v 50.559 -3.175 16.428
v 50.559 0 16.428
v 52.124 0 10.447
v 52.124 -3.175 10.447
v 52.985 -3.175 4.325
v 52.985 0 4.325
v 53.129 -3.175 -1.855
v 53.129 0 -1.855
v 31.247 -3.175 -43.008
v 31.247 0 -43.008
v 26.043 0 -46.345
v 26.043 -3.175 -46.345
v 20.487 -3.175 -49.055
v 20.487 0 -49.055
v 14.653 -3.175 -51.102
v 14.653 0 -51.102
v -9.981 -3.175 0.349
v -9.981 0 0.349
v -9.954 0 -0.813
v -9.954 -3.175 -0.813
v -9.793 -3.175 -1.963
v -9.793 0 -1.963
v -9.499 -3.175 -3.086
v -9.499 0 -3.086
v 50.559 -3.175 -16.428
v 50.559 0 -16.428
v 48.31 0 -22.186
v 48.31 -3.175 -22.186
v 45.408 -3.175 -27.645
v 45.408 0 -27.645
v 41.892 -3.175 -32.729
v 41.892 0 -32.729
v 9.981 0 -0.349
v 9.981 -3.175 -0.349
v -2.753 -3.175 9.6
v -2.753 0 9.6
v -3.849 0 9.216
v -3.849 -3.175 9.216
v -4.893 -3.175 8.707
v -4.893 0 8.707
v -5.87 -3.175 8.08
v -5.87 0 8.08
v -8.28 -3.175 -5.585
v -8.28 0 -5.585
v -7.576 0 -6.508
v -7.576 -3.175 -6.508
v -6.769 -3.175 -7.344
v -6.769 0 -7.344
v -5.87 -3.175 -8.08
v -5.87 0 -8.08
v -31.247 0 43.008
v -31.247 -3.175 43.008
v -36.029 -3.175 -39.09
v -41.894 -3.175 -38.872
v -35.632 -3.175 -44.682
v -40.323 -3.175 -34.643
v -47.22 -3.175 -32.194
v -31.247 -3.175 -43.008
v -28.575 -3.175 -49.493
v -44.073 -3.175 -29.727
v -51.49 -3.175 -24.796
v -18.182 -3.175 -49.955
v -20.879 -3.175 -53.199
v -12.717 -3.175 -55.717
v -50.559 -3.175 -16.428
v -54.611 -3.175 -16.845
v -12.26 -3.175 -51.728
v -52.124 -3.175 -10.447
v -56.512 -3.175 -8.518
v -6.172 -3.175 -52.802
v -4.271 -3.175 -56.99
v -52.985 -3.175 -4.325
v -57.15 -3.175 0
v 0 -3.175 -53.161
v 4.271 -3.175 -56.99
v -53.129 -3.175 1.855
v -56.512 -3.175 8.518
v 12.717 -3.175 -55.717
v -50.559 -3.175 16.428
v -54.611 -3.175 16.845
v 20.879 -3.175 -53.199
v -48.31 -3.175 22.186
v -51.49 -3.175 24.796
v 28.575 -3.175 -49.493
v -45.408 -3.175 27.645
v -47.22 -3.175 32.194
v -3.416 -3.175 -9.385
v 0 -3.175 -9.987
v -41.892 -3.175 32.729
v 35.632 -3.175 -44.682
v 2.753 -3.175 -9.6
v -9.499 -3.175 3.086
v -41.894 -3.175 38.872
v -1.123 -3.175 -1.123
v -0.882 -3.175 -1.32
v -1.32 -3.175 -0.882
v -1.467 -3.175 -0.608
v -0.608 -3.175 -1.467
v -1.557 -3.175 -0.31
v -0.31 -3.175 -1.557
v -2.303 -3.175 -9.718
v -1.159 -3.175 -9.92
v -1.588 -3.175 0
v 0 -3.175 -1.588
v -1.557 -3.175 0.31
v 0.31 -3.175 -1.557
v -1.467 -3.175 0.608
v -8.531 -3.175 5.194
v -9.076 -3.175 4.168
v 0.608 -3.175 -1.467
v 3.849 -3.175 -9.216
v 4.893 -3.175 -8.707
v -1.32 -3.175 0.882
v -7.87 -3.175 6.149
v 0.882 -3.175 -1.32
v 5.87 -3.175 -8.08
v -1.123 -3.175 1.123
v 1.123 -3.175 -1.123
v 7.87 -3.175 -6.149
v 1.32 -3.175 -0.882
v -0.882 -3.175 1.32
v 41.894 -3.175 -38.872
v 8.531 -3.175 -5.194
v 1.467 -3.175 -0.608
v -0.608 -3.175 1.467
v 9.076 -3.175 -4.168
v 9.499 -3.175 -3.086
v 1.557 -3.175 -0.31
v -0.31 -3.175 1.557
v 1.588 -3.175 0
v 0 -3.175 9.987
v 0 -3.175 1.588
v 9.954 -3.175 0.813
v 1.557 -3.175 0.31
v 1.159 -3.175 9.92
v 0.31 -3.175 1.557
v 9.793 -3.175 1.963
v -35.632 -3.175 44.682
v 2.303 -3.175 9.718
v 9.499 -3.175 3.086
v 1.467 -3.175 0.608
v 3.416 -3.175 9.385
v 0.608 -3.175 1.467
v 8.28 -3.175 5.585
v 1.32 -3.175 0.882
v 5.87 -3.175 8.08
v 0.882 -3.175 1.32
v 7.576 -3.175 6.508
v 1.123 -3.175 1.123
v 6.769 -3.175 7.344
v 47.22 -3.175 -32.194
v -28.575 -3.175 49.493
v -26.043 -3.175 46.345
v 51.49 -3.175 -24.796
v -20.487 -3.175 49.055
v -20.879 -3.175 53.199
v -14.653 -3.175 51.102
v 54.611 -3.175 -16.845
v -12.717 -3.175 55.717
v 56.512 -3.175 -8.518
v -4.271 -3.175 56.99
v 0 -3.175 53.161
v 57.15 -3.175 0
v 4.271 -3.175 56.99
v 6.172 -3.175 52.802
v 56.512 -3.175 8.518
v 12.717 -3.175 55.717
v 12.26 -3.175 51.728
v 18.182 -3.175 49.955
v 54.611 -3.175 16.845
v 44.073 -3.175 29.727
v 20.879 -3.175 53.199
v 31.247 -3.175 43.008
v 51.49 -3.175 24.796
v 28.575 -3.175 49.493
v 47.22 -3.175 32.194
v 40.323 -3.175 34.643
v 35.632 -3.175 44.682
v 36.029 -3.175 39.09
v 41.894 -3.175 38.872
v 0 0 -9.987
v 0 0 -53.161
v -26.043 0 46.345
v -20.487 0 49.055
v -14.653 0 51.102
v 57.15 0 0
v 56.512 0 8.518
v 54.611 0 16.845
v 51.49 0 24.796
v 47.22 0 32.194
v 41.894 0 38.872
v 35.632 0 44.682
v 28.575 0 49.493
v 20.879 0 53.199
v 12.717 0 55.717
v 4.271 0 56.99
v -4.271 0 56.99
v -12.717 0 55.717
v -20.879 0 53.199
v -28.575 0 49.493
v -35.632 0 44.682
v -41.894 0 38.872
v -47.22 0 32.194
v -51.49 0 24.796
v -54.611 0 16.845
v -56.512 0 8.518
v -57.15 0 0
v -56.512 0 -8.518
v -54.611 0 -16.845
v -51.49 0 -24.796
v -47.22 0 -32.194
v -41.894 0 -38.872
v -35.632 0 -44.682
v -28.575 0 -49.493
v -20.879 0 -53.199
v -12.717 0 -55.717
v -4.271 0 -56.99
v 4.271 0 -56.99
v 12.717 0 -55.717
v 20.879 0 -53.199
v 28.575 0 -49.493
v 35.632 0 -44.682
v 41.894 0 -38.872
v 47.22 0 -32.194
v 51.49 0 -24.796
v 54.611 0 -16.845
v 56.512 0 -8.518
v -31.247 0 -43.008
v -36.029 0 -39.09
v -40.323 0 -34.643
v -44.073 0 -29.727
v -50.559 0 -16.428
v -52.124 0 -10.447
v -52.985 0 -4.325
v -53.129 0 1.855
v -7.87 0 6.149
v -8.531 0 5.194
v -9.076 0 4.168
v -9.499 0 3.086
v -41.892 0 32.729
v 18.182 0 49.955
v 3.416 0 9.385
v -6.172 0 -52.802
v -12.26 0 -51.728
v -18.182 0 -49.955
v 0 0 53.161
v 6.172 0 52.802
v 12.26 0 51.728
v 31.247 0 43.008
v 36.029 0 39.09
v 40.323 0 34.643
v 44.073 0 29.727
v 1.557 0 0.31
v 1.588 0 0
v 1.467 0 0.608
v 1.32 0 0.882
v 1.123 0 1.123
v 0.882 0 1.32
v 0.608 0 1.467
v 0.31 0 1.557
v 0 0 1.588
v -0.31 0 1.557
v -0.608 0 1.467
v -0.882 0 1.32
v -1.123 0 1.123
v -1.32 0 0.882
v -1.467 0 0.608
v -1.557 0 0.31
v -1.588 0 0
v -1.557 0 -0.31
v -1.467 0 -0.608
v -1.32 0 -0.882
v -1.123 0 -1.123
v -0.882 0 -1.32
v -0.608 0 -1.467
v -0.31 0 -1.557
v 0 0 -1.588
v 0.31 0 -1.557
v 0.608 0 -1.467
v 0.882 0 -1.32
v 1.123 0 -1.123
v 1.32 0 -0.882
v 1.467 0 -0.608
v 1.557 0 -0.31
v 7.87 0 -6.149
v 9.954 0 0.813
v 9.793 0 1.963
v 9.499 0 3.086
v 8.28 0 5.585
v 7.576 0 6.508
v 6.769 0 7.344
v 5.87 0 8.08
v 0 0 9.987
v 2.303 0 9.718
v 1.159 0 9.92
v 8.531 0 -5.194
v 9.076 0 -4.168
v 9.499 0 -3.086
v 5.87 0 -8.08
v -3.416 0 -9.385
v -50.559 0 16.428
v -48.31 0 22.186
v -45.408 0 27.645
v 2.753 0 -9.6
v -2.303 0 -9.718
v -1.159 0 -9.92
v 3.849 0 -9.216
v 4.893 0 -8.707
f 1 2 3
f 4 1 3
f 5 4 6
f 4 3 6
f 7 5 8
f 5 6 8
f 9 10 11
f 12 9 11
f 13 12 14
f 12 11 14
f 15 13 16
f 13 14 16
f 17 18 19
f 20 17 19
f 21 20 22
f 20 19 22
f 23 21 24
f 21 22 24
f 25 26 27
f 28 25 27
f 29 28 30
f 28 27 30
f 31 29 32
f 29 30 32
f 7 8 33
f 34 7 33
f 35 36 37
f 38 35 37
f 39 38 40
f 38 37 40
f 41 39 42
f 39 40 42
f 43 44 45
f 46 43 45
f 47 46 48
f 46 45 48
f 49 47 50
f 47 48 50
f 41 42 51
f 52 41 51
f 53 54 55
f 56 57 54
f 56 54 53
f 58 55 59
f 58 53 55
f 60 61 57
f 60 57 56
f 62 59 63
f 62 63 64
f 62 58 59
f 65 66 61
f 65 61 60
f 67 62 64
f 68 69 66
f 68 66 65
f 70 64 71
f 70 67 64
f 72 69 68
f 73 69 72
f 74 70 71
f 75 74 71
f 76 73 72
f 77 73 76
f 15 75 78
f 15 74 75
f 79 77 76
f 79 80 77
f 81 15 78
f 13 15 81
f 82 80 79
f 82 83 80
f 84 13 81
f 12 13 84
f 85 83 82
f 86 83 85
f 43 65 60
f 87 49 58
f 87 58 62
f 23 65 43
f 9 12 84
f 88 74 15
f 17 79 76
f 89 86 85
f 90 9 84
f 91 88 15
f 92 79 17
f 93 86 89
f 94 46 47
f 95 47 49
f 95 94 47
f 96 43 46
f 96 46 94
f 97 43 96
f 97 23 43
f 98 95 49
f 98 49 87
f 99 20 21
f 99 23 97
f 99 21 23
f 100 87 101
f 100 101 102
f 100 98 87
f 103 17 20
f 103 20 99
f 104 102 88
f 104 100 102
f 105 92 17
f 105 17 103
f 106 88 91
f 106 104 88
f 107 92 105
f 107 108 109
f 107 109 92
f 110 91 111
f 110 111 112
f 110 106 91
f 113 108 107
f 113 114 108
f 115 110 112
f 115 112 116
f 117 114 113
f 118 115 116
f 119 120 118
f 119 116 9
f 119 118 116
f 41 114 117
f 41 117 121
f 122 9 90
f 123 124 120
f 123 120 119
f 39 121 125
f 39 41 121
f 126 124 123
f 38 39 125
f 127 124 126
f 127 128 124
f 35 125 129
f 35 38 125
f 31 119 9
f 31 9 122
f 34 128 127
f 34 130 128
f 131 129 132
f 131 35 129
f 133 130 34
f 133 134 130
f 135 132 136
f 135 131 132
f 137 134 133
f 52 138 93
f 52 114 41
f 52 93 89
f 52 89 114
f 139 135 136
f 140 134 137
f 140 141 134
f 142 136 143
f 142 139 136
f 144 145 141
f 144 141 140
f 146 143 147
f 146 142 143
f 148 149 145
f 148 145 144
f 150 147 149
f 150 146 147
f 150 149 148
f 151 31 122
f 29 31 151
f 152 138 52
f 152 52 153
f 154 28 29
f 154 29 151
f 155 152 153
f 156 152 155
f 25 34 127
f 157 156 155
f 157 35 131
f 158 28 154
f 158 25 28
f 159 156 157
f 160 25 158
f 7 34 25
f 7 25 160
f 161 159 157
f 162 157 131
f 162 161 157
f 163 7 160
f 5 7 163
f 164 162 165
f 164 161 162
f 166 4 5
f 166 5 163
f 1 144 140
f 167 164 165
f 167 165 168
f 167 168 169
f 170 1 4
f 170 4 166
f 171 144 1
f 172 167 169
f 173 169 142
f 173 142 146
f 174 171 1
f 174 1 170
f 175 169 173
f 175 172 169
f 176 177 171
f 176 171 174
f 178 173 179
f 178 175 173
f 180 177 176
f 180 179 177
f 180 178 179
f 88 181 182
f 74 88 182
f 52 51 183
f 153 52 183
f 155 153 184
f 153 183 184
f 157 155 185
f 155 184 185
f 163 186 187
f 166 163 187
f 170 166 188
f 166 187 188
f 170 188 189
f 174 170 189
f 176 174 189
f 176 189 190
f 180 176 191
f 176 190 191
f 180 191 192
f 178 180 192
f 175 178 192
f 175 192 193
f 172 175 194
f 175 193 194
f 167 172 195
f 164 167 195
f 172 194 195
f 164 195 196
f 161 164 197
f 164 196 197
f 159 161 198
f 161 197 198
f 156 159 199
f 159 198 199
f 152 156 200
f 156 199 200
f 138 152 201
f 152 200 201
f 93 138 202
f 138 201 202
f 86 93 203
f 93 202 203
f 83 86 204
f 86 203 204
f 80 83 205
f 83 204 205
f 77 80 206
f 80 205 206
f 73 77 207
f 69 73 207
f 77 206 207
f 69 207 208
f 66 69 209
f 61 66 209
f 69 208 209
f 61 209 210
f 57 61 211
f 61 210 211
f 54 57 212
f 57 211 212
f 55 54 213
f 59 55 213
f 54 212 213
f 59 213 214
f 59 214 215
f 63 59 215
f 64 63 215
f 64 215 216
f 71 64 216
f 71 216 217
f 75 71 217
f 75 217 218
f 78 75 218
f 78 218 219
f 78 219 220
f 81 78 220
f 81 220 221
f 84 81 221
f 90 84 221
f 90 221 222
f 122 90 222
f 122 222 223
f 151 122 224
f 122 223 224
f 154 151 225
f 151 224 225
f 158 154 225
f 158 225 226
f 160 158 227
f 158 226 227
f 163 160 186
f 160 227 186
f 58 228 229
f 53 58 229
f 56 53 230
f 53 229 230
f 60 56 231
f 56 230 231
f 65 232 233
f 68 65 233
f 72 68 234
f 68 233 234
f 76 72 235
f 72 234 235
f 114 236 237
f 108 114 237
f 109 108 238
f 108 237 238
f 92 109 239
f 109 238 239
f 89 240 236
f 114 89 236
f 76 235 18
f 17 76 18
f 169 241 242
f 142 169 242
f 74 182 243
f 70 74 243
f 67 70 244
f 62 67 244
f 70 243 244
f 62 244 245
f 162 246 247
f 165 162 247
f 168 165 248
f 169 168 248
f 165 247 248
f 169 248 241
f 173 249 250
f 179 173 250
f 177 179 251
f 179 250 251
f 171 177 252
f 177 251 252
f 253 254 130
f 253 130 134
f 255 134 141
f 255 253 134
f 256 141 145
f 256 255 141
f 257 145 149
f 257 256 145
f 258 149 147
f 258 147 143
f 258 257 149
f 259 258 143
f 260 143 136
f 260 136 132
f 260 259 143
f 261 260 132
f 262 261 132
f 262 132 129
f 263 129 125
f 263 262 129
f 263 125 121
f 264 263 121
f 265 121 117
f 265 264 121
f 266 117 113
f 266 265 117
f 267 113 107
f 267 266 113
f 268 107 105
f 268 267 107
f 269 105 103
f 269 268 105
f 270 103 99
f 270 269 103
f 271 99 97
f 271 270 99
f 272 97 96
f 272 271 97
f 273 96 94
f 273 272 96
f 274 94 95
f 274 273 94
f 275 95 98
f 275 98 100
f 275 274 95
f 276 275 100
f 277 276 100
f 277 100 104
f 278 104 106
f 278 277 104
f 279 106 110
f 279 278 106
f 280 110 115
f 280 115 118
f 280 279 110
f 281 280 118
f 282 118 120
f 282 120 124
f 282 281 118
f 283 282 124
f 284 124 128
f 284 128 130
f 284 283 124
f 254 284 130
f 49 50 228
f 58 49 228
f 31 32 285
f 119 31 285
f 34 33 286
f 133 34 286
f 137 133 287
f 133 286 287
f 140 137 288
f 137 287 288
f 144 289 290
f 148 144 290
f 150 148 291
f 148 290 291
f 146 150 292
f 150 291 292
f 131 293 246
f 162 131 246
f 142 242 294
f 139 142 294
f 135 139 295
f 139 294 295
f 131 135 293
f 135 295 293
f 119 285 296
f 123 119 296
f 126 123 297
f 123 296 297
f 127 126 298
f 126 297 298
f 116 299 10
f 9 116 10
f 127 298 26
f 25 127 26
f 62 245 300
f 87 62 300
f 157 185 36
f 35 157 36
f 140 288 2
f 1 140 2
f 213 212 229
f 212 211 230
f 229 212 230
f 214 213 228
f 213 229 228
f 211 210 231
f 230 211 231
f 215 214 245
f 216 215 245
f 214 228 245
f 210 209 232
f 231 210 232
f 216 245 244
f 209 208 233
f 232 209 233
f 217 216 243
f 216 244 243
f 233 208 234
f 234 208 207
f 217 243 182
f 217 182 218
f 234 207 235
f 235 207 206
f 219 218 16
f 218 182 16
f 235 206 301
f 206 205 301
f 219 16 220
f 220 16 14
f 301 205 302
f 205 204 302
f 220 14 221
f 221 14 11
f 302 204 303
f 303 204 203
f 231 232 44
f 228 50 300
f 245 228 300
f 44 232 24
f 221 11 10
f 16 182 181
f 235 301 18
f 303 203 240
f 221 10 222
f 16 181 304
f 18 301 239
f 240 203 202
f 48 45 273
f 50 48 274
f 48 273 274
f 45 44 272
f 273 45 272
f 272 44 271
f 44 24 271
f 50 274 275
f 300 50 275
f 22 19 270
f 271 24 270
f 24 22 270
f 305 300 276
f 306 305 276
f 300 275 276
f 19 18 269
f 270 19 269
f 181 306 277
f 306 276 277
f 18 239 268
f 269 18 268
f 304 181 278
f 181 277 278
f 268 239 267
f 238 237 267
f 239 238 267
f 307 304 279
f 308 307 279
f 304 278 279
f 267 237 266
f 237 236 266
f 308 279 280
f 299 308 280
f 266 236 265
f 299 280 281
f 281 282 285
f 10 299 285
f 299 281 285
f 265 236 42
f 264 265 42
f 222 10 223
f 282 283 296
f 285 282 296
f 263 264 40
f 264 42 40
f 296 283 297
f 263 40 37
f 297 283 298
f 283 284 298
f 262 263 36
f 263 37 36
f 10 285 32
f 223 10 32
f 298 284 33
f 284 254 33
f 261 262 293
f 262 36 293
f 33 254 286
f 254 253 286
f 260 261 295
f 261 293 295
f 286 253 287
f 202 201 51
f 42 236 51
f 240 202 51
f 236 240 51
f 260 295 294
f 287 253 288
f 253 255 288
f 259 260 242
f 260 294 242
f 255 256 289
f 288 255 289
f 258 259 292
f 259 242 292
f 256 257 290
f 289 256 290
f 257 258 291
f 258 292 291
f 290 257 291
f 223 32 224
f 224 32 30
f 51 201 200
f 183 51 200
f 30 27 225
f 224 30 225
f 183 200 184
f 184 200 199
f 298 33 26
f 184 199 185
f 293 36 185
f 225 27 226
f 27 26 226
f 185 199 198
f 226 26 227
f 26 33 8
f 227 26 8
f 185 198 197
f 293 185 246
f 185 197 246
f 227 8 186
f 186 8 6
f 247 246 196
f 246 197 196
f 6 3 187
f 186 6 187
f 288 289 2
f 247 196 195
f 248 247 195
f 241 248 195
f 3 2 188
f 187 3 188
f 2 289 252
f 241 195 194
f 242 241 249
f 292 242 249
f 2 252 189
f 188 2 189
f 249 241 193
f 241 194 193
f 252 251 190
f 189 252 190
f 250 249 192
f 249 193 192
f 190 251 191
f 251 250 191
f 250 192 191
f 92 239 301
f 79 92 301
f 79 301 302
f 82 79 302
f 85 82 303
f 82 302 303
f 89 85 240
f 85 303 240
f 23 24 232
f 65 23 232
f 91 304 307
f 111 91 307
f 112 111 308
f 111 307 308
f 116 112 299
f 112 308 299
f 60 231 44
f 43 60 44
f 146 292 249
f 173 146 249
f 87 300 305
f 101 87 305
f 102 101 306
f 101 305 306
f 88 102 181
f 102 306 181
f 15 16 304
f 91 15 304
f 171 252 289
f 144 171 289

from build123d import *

# Parameters (mm, degrees)
F0_R     = 57.15
F0_R_2   = 1.5875
F1_DEPTH = 3.175


with BuildPart() as f1:
    # F0 (on Front) → F1 (new body)
    with BuildSketch(Plane.XZ):
        Circle(F0_R)
        with BuildLine():
            ThreePointArc((0, -53.161082), (-9.231325, -52.353446), (-18.182161, -49.955077))
            Line((-18.182161, -49.955077), (-3.415888, -9.385075))
            ThreePointArc((-3.415888, -9.385075), (-1.734292, -9.835657), (0, -9.987388))
            Line((0, -9.987388), (0, -53.161082))
        make_face(mode=Mode.SUBTRACT)
        with BuildLine():
            ThreePointArc((-50.559194, -16.427678), (-52.643722, -7.398593), (-53.128698, 1.855295))
            Line((-53.128698, 1.855295), (-9.981304, 0.348555))
            ThreePointArc((-9.981304, 0.348555), (-9.890191, -1.389976), (-9.49857, -3.086273))
            Line((-9.49857, -3.086273), (-50.559194, -16.427678))
        make_face(mode=Mode.SUBTRACT)
        with BuildLine():
            ThreePointArc((-31.2473, -43.008219), (-38.240882, -36.928791), (-44.072535, -29.7273))
            Line((-44.072535, -29.7273), (-8.27992, -5.584876))
            ThreePointArc((-8.27992, -5.584876), (-7.184326, -6.937823), (-5.870439, -8.079966))
            Line((-5.870439, -8.079966), (-31.2473, -43.008219))
        make_face(mode=Mode.SUBTRACT)
        with BuildLine():
            ThreePointArc((31.2473, -43.008219), (23.304285, -47.780864), (14.65318, -51.101712))
            Line((14.65318, -51.101712), (2.752897, -9.600493))
            ThreePointArc((2.752897, -9.600493), (4.378183, -8.976605), (5.870439, -8.079966))
            Line((5.870439, -8.079966), (31.2473, -43.008219))
        make_face(mode=Mode.SUBTRACT)
        with BuildLine():
            ThreePointArc((50.559194, -16.427678), (46.93845, -24.957616), (41.891505, -32.72923))
            Line((41.891505, -32.72923), (7.870169, -6.14885))
            ThreePointArc((7.870169, -6.14885), (8.81834, -4.688795), (9.49857, -3.086273))
            Line((9.49857, -3.086273), (50.559194, -16.427678))
        make_face(mode=Mode.SUBTRACT)
        with BuildLine():
            ThreePointArc((-50.559194, 16.427678), (-46.93845, 24.957616), (-41.891505, 32.72923))
            Line((-41.891505, 32.72923), (-7.870169, 6.14885))
            ThreePointArc((-7.870169, 6.14885), (-8.81834, 4.688795), (-9.49857, 3.086273))
            Line((-9.49857, 3.086273), (-50.559194, 16.427678))
        make_face(mode=Mode.SUBTRACT)
        with BuildLine():
            ThreePointArc((-31.2473, 43.008219), (-23.304285, 47.780864), (-14.65318, 51.101712))
            Line((-14.65318, 51.101712), (-2.752897, 9.600493))
            ThreePointArc((-2.752897, 9.600493), (-4.378183, 8.976605), (-5.870439, 8.079966))
            Line((-5.870439, 8.079966), (-31.2473, 43.008219))
        make_face(mode=Mode.SUBTRACT)
        Circle(F0_R_2, mode=Mode.SUBTRACT)
        with BuildLine():
            ThreePointArc((31.2473, 43.008219), (38.240882, 36.928791), (44.072535, 29.7273))
            Line((44.072535, 29.7273), (8.27992, 5.584876))
            ThreePointArc((8.27992, 5.584876), (7.184326, 6.937823), (5.870439, 8.079966))
            Line((5.870439, 8.079966), (31.2473, 43.008219))
        make_face(mode=Mode.SUBTRACT)
        with BuildLine():
            ThreePointArc((50.559194, 16.427678), (52.643722, 7.398593), (53.128698, -1.855295))
            Line((53.128698, -1.855295), (9.981304, -0.348555))
            ThreePointArc((9.981304, -0.348555), (9.890191, 1.389976), (9.49857, 3.086273))
            Line((9.49857, 3.086273), (50.559194, 16.427678))
        make_face(mode=Mode.SUBTRACT)
        with BuildLine():
            ThreePointArc((0, 53.161082), (9.231325, 52.353446), (18.182161, 49.955077))
            Line((18.182161, 49.955077), (3.415888, 9.385075))
            ThreePointArc((3.415888, 9.385075), (1.734292, 9.835657), (0, 9.987388))
            Line((0, 9.987388), (0, 53.161082))
        make_face(mode=Mode.SUBTRACT)
    extrude(amount=F1_DEPTH)


solid = f1.part
